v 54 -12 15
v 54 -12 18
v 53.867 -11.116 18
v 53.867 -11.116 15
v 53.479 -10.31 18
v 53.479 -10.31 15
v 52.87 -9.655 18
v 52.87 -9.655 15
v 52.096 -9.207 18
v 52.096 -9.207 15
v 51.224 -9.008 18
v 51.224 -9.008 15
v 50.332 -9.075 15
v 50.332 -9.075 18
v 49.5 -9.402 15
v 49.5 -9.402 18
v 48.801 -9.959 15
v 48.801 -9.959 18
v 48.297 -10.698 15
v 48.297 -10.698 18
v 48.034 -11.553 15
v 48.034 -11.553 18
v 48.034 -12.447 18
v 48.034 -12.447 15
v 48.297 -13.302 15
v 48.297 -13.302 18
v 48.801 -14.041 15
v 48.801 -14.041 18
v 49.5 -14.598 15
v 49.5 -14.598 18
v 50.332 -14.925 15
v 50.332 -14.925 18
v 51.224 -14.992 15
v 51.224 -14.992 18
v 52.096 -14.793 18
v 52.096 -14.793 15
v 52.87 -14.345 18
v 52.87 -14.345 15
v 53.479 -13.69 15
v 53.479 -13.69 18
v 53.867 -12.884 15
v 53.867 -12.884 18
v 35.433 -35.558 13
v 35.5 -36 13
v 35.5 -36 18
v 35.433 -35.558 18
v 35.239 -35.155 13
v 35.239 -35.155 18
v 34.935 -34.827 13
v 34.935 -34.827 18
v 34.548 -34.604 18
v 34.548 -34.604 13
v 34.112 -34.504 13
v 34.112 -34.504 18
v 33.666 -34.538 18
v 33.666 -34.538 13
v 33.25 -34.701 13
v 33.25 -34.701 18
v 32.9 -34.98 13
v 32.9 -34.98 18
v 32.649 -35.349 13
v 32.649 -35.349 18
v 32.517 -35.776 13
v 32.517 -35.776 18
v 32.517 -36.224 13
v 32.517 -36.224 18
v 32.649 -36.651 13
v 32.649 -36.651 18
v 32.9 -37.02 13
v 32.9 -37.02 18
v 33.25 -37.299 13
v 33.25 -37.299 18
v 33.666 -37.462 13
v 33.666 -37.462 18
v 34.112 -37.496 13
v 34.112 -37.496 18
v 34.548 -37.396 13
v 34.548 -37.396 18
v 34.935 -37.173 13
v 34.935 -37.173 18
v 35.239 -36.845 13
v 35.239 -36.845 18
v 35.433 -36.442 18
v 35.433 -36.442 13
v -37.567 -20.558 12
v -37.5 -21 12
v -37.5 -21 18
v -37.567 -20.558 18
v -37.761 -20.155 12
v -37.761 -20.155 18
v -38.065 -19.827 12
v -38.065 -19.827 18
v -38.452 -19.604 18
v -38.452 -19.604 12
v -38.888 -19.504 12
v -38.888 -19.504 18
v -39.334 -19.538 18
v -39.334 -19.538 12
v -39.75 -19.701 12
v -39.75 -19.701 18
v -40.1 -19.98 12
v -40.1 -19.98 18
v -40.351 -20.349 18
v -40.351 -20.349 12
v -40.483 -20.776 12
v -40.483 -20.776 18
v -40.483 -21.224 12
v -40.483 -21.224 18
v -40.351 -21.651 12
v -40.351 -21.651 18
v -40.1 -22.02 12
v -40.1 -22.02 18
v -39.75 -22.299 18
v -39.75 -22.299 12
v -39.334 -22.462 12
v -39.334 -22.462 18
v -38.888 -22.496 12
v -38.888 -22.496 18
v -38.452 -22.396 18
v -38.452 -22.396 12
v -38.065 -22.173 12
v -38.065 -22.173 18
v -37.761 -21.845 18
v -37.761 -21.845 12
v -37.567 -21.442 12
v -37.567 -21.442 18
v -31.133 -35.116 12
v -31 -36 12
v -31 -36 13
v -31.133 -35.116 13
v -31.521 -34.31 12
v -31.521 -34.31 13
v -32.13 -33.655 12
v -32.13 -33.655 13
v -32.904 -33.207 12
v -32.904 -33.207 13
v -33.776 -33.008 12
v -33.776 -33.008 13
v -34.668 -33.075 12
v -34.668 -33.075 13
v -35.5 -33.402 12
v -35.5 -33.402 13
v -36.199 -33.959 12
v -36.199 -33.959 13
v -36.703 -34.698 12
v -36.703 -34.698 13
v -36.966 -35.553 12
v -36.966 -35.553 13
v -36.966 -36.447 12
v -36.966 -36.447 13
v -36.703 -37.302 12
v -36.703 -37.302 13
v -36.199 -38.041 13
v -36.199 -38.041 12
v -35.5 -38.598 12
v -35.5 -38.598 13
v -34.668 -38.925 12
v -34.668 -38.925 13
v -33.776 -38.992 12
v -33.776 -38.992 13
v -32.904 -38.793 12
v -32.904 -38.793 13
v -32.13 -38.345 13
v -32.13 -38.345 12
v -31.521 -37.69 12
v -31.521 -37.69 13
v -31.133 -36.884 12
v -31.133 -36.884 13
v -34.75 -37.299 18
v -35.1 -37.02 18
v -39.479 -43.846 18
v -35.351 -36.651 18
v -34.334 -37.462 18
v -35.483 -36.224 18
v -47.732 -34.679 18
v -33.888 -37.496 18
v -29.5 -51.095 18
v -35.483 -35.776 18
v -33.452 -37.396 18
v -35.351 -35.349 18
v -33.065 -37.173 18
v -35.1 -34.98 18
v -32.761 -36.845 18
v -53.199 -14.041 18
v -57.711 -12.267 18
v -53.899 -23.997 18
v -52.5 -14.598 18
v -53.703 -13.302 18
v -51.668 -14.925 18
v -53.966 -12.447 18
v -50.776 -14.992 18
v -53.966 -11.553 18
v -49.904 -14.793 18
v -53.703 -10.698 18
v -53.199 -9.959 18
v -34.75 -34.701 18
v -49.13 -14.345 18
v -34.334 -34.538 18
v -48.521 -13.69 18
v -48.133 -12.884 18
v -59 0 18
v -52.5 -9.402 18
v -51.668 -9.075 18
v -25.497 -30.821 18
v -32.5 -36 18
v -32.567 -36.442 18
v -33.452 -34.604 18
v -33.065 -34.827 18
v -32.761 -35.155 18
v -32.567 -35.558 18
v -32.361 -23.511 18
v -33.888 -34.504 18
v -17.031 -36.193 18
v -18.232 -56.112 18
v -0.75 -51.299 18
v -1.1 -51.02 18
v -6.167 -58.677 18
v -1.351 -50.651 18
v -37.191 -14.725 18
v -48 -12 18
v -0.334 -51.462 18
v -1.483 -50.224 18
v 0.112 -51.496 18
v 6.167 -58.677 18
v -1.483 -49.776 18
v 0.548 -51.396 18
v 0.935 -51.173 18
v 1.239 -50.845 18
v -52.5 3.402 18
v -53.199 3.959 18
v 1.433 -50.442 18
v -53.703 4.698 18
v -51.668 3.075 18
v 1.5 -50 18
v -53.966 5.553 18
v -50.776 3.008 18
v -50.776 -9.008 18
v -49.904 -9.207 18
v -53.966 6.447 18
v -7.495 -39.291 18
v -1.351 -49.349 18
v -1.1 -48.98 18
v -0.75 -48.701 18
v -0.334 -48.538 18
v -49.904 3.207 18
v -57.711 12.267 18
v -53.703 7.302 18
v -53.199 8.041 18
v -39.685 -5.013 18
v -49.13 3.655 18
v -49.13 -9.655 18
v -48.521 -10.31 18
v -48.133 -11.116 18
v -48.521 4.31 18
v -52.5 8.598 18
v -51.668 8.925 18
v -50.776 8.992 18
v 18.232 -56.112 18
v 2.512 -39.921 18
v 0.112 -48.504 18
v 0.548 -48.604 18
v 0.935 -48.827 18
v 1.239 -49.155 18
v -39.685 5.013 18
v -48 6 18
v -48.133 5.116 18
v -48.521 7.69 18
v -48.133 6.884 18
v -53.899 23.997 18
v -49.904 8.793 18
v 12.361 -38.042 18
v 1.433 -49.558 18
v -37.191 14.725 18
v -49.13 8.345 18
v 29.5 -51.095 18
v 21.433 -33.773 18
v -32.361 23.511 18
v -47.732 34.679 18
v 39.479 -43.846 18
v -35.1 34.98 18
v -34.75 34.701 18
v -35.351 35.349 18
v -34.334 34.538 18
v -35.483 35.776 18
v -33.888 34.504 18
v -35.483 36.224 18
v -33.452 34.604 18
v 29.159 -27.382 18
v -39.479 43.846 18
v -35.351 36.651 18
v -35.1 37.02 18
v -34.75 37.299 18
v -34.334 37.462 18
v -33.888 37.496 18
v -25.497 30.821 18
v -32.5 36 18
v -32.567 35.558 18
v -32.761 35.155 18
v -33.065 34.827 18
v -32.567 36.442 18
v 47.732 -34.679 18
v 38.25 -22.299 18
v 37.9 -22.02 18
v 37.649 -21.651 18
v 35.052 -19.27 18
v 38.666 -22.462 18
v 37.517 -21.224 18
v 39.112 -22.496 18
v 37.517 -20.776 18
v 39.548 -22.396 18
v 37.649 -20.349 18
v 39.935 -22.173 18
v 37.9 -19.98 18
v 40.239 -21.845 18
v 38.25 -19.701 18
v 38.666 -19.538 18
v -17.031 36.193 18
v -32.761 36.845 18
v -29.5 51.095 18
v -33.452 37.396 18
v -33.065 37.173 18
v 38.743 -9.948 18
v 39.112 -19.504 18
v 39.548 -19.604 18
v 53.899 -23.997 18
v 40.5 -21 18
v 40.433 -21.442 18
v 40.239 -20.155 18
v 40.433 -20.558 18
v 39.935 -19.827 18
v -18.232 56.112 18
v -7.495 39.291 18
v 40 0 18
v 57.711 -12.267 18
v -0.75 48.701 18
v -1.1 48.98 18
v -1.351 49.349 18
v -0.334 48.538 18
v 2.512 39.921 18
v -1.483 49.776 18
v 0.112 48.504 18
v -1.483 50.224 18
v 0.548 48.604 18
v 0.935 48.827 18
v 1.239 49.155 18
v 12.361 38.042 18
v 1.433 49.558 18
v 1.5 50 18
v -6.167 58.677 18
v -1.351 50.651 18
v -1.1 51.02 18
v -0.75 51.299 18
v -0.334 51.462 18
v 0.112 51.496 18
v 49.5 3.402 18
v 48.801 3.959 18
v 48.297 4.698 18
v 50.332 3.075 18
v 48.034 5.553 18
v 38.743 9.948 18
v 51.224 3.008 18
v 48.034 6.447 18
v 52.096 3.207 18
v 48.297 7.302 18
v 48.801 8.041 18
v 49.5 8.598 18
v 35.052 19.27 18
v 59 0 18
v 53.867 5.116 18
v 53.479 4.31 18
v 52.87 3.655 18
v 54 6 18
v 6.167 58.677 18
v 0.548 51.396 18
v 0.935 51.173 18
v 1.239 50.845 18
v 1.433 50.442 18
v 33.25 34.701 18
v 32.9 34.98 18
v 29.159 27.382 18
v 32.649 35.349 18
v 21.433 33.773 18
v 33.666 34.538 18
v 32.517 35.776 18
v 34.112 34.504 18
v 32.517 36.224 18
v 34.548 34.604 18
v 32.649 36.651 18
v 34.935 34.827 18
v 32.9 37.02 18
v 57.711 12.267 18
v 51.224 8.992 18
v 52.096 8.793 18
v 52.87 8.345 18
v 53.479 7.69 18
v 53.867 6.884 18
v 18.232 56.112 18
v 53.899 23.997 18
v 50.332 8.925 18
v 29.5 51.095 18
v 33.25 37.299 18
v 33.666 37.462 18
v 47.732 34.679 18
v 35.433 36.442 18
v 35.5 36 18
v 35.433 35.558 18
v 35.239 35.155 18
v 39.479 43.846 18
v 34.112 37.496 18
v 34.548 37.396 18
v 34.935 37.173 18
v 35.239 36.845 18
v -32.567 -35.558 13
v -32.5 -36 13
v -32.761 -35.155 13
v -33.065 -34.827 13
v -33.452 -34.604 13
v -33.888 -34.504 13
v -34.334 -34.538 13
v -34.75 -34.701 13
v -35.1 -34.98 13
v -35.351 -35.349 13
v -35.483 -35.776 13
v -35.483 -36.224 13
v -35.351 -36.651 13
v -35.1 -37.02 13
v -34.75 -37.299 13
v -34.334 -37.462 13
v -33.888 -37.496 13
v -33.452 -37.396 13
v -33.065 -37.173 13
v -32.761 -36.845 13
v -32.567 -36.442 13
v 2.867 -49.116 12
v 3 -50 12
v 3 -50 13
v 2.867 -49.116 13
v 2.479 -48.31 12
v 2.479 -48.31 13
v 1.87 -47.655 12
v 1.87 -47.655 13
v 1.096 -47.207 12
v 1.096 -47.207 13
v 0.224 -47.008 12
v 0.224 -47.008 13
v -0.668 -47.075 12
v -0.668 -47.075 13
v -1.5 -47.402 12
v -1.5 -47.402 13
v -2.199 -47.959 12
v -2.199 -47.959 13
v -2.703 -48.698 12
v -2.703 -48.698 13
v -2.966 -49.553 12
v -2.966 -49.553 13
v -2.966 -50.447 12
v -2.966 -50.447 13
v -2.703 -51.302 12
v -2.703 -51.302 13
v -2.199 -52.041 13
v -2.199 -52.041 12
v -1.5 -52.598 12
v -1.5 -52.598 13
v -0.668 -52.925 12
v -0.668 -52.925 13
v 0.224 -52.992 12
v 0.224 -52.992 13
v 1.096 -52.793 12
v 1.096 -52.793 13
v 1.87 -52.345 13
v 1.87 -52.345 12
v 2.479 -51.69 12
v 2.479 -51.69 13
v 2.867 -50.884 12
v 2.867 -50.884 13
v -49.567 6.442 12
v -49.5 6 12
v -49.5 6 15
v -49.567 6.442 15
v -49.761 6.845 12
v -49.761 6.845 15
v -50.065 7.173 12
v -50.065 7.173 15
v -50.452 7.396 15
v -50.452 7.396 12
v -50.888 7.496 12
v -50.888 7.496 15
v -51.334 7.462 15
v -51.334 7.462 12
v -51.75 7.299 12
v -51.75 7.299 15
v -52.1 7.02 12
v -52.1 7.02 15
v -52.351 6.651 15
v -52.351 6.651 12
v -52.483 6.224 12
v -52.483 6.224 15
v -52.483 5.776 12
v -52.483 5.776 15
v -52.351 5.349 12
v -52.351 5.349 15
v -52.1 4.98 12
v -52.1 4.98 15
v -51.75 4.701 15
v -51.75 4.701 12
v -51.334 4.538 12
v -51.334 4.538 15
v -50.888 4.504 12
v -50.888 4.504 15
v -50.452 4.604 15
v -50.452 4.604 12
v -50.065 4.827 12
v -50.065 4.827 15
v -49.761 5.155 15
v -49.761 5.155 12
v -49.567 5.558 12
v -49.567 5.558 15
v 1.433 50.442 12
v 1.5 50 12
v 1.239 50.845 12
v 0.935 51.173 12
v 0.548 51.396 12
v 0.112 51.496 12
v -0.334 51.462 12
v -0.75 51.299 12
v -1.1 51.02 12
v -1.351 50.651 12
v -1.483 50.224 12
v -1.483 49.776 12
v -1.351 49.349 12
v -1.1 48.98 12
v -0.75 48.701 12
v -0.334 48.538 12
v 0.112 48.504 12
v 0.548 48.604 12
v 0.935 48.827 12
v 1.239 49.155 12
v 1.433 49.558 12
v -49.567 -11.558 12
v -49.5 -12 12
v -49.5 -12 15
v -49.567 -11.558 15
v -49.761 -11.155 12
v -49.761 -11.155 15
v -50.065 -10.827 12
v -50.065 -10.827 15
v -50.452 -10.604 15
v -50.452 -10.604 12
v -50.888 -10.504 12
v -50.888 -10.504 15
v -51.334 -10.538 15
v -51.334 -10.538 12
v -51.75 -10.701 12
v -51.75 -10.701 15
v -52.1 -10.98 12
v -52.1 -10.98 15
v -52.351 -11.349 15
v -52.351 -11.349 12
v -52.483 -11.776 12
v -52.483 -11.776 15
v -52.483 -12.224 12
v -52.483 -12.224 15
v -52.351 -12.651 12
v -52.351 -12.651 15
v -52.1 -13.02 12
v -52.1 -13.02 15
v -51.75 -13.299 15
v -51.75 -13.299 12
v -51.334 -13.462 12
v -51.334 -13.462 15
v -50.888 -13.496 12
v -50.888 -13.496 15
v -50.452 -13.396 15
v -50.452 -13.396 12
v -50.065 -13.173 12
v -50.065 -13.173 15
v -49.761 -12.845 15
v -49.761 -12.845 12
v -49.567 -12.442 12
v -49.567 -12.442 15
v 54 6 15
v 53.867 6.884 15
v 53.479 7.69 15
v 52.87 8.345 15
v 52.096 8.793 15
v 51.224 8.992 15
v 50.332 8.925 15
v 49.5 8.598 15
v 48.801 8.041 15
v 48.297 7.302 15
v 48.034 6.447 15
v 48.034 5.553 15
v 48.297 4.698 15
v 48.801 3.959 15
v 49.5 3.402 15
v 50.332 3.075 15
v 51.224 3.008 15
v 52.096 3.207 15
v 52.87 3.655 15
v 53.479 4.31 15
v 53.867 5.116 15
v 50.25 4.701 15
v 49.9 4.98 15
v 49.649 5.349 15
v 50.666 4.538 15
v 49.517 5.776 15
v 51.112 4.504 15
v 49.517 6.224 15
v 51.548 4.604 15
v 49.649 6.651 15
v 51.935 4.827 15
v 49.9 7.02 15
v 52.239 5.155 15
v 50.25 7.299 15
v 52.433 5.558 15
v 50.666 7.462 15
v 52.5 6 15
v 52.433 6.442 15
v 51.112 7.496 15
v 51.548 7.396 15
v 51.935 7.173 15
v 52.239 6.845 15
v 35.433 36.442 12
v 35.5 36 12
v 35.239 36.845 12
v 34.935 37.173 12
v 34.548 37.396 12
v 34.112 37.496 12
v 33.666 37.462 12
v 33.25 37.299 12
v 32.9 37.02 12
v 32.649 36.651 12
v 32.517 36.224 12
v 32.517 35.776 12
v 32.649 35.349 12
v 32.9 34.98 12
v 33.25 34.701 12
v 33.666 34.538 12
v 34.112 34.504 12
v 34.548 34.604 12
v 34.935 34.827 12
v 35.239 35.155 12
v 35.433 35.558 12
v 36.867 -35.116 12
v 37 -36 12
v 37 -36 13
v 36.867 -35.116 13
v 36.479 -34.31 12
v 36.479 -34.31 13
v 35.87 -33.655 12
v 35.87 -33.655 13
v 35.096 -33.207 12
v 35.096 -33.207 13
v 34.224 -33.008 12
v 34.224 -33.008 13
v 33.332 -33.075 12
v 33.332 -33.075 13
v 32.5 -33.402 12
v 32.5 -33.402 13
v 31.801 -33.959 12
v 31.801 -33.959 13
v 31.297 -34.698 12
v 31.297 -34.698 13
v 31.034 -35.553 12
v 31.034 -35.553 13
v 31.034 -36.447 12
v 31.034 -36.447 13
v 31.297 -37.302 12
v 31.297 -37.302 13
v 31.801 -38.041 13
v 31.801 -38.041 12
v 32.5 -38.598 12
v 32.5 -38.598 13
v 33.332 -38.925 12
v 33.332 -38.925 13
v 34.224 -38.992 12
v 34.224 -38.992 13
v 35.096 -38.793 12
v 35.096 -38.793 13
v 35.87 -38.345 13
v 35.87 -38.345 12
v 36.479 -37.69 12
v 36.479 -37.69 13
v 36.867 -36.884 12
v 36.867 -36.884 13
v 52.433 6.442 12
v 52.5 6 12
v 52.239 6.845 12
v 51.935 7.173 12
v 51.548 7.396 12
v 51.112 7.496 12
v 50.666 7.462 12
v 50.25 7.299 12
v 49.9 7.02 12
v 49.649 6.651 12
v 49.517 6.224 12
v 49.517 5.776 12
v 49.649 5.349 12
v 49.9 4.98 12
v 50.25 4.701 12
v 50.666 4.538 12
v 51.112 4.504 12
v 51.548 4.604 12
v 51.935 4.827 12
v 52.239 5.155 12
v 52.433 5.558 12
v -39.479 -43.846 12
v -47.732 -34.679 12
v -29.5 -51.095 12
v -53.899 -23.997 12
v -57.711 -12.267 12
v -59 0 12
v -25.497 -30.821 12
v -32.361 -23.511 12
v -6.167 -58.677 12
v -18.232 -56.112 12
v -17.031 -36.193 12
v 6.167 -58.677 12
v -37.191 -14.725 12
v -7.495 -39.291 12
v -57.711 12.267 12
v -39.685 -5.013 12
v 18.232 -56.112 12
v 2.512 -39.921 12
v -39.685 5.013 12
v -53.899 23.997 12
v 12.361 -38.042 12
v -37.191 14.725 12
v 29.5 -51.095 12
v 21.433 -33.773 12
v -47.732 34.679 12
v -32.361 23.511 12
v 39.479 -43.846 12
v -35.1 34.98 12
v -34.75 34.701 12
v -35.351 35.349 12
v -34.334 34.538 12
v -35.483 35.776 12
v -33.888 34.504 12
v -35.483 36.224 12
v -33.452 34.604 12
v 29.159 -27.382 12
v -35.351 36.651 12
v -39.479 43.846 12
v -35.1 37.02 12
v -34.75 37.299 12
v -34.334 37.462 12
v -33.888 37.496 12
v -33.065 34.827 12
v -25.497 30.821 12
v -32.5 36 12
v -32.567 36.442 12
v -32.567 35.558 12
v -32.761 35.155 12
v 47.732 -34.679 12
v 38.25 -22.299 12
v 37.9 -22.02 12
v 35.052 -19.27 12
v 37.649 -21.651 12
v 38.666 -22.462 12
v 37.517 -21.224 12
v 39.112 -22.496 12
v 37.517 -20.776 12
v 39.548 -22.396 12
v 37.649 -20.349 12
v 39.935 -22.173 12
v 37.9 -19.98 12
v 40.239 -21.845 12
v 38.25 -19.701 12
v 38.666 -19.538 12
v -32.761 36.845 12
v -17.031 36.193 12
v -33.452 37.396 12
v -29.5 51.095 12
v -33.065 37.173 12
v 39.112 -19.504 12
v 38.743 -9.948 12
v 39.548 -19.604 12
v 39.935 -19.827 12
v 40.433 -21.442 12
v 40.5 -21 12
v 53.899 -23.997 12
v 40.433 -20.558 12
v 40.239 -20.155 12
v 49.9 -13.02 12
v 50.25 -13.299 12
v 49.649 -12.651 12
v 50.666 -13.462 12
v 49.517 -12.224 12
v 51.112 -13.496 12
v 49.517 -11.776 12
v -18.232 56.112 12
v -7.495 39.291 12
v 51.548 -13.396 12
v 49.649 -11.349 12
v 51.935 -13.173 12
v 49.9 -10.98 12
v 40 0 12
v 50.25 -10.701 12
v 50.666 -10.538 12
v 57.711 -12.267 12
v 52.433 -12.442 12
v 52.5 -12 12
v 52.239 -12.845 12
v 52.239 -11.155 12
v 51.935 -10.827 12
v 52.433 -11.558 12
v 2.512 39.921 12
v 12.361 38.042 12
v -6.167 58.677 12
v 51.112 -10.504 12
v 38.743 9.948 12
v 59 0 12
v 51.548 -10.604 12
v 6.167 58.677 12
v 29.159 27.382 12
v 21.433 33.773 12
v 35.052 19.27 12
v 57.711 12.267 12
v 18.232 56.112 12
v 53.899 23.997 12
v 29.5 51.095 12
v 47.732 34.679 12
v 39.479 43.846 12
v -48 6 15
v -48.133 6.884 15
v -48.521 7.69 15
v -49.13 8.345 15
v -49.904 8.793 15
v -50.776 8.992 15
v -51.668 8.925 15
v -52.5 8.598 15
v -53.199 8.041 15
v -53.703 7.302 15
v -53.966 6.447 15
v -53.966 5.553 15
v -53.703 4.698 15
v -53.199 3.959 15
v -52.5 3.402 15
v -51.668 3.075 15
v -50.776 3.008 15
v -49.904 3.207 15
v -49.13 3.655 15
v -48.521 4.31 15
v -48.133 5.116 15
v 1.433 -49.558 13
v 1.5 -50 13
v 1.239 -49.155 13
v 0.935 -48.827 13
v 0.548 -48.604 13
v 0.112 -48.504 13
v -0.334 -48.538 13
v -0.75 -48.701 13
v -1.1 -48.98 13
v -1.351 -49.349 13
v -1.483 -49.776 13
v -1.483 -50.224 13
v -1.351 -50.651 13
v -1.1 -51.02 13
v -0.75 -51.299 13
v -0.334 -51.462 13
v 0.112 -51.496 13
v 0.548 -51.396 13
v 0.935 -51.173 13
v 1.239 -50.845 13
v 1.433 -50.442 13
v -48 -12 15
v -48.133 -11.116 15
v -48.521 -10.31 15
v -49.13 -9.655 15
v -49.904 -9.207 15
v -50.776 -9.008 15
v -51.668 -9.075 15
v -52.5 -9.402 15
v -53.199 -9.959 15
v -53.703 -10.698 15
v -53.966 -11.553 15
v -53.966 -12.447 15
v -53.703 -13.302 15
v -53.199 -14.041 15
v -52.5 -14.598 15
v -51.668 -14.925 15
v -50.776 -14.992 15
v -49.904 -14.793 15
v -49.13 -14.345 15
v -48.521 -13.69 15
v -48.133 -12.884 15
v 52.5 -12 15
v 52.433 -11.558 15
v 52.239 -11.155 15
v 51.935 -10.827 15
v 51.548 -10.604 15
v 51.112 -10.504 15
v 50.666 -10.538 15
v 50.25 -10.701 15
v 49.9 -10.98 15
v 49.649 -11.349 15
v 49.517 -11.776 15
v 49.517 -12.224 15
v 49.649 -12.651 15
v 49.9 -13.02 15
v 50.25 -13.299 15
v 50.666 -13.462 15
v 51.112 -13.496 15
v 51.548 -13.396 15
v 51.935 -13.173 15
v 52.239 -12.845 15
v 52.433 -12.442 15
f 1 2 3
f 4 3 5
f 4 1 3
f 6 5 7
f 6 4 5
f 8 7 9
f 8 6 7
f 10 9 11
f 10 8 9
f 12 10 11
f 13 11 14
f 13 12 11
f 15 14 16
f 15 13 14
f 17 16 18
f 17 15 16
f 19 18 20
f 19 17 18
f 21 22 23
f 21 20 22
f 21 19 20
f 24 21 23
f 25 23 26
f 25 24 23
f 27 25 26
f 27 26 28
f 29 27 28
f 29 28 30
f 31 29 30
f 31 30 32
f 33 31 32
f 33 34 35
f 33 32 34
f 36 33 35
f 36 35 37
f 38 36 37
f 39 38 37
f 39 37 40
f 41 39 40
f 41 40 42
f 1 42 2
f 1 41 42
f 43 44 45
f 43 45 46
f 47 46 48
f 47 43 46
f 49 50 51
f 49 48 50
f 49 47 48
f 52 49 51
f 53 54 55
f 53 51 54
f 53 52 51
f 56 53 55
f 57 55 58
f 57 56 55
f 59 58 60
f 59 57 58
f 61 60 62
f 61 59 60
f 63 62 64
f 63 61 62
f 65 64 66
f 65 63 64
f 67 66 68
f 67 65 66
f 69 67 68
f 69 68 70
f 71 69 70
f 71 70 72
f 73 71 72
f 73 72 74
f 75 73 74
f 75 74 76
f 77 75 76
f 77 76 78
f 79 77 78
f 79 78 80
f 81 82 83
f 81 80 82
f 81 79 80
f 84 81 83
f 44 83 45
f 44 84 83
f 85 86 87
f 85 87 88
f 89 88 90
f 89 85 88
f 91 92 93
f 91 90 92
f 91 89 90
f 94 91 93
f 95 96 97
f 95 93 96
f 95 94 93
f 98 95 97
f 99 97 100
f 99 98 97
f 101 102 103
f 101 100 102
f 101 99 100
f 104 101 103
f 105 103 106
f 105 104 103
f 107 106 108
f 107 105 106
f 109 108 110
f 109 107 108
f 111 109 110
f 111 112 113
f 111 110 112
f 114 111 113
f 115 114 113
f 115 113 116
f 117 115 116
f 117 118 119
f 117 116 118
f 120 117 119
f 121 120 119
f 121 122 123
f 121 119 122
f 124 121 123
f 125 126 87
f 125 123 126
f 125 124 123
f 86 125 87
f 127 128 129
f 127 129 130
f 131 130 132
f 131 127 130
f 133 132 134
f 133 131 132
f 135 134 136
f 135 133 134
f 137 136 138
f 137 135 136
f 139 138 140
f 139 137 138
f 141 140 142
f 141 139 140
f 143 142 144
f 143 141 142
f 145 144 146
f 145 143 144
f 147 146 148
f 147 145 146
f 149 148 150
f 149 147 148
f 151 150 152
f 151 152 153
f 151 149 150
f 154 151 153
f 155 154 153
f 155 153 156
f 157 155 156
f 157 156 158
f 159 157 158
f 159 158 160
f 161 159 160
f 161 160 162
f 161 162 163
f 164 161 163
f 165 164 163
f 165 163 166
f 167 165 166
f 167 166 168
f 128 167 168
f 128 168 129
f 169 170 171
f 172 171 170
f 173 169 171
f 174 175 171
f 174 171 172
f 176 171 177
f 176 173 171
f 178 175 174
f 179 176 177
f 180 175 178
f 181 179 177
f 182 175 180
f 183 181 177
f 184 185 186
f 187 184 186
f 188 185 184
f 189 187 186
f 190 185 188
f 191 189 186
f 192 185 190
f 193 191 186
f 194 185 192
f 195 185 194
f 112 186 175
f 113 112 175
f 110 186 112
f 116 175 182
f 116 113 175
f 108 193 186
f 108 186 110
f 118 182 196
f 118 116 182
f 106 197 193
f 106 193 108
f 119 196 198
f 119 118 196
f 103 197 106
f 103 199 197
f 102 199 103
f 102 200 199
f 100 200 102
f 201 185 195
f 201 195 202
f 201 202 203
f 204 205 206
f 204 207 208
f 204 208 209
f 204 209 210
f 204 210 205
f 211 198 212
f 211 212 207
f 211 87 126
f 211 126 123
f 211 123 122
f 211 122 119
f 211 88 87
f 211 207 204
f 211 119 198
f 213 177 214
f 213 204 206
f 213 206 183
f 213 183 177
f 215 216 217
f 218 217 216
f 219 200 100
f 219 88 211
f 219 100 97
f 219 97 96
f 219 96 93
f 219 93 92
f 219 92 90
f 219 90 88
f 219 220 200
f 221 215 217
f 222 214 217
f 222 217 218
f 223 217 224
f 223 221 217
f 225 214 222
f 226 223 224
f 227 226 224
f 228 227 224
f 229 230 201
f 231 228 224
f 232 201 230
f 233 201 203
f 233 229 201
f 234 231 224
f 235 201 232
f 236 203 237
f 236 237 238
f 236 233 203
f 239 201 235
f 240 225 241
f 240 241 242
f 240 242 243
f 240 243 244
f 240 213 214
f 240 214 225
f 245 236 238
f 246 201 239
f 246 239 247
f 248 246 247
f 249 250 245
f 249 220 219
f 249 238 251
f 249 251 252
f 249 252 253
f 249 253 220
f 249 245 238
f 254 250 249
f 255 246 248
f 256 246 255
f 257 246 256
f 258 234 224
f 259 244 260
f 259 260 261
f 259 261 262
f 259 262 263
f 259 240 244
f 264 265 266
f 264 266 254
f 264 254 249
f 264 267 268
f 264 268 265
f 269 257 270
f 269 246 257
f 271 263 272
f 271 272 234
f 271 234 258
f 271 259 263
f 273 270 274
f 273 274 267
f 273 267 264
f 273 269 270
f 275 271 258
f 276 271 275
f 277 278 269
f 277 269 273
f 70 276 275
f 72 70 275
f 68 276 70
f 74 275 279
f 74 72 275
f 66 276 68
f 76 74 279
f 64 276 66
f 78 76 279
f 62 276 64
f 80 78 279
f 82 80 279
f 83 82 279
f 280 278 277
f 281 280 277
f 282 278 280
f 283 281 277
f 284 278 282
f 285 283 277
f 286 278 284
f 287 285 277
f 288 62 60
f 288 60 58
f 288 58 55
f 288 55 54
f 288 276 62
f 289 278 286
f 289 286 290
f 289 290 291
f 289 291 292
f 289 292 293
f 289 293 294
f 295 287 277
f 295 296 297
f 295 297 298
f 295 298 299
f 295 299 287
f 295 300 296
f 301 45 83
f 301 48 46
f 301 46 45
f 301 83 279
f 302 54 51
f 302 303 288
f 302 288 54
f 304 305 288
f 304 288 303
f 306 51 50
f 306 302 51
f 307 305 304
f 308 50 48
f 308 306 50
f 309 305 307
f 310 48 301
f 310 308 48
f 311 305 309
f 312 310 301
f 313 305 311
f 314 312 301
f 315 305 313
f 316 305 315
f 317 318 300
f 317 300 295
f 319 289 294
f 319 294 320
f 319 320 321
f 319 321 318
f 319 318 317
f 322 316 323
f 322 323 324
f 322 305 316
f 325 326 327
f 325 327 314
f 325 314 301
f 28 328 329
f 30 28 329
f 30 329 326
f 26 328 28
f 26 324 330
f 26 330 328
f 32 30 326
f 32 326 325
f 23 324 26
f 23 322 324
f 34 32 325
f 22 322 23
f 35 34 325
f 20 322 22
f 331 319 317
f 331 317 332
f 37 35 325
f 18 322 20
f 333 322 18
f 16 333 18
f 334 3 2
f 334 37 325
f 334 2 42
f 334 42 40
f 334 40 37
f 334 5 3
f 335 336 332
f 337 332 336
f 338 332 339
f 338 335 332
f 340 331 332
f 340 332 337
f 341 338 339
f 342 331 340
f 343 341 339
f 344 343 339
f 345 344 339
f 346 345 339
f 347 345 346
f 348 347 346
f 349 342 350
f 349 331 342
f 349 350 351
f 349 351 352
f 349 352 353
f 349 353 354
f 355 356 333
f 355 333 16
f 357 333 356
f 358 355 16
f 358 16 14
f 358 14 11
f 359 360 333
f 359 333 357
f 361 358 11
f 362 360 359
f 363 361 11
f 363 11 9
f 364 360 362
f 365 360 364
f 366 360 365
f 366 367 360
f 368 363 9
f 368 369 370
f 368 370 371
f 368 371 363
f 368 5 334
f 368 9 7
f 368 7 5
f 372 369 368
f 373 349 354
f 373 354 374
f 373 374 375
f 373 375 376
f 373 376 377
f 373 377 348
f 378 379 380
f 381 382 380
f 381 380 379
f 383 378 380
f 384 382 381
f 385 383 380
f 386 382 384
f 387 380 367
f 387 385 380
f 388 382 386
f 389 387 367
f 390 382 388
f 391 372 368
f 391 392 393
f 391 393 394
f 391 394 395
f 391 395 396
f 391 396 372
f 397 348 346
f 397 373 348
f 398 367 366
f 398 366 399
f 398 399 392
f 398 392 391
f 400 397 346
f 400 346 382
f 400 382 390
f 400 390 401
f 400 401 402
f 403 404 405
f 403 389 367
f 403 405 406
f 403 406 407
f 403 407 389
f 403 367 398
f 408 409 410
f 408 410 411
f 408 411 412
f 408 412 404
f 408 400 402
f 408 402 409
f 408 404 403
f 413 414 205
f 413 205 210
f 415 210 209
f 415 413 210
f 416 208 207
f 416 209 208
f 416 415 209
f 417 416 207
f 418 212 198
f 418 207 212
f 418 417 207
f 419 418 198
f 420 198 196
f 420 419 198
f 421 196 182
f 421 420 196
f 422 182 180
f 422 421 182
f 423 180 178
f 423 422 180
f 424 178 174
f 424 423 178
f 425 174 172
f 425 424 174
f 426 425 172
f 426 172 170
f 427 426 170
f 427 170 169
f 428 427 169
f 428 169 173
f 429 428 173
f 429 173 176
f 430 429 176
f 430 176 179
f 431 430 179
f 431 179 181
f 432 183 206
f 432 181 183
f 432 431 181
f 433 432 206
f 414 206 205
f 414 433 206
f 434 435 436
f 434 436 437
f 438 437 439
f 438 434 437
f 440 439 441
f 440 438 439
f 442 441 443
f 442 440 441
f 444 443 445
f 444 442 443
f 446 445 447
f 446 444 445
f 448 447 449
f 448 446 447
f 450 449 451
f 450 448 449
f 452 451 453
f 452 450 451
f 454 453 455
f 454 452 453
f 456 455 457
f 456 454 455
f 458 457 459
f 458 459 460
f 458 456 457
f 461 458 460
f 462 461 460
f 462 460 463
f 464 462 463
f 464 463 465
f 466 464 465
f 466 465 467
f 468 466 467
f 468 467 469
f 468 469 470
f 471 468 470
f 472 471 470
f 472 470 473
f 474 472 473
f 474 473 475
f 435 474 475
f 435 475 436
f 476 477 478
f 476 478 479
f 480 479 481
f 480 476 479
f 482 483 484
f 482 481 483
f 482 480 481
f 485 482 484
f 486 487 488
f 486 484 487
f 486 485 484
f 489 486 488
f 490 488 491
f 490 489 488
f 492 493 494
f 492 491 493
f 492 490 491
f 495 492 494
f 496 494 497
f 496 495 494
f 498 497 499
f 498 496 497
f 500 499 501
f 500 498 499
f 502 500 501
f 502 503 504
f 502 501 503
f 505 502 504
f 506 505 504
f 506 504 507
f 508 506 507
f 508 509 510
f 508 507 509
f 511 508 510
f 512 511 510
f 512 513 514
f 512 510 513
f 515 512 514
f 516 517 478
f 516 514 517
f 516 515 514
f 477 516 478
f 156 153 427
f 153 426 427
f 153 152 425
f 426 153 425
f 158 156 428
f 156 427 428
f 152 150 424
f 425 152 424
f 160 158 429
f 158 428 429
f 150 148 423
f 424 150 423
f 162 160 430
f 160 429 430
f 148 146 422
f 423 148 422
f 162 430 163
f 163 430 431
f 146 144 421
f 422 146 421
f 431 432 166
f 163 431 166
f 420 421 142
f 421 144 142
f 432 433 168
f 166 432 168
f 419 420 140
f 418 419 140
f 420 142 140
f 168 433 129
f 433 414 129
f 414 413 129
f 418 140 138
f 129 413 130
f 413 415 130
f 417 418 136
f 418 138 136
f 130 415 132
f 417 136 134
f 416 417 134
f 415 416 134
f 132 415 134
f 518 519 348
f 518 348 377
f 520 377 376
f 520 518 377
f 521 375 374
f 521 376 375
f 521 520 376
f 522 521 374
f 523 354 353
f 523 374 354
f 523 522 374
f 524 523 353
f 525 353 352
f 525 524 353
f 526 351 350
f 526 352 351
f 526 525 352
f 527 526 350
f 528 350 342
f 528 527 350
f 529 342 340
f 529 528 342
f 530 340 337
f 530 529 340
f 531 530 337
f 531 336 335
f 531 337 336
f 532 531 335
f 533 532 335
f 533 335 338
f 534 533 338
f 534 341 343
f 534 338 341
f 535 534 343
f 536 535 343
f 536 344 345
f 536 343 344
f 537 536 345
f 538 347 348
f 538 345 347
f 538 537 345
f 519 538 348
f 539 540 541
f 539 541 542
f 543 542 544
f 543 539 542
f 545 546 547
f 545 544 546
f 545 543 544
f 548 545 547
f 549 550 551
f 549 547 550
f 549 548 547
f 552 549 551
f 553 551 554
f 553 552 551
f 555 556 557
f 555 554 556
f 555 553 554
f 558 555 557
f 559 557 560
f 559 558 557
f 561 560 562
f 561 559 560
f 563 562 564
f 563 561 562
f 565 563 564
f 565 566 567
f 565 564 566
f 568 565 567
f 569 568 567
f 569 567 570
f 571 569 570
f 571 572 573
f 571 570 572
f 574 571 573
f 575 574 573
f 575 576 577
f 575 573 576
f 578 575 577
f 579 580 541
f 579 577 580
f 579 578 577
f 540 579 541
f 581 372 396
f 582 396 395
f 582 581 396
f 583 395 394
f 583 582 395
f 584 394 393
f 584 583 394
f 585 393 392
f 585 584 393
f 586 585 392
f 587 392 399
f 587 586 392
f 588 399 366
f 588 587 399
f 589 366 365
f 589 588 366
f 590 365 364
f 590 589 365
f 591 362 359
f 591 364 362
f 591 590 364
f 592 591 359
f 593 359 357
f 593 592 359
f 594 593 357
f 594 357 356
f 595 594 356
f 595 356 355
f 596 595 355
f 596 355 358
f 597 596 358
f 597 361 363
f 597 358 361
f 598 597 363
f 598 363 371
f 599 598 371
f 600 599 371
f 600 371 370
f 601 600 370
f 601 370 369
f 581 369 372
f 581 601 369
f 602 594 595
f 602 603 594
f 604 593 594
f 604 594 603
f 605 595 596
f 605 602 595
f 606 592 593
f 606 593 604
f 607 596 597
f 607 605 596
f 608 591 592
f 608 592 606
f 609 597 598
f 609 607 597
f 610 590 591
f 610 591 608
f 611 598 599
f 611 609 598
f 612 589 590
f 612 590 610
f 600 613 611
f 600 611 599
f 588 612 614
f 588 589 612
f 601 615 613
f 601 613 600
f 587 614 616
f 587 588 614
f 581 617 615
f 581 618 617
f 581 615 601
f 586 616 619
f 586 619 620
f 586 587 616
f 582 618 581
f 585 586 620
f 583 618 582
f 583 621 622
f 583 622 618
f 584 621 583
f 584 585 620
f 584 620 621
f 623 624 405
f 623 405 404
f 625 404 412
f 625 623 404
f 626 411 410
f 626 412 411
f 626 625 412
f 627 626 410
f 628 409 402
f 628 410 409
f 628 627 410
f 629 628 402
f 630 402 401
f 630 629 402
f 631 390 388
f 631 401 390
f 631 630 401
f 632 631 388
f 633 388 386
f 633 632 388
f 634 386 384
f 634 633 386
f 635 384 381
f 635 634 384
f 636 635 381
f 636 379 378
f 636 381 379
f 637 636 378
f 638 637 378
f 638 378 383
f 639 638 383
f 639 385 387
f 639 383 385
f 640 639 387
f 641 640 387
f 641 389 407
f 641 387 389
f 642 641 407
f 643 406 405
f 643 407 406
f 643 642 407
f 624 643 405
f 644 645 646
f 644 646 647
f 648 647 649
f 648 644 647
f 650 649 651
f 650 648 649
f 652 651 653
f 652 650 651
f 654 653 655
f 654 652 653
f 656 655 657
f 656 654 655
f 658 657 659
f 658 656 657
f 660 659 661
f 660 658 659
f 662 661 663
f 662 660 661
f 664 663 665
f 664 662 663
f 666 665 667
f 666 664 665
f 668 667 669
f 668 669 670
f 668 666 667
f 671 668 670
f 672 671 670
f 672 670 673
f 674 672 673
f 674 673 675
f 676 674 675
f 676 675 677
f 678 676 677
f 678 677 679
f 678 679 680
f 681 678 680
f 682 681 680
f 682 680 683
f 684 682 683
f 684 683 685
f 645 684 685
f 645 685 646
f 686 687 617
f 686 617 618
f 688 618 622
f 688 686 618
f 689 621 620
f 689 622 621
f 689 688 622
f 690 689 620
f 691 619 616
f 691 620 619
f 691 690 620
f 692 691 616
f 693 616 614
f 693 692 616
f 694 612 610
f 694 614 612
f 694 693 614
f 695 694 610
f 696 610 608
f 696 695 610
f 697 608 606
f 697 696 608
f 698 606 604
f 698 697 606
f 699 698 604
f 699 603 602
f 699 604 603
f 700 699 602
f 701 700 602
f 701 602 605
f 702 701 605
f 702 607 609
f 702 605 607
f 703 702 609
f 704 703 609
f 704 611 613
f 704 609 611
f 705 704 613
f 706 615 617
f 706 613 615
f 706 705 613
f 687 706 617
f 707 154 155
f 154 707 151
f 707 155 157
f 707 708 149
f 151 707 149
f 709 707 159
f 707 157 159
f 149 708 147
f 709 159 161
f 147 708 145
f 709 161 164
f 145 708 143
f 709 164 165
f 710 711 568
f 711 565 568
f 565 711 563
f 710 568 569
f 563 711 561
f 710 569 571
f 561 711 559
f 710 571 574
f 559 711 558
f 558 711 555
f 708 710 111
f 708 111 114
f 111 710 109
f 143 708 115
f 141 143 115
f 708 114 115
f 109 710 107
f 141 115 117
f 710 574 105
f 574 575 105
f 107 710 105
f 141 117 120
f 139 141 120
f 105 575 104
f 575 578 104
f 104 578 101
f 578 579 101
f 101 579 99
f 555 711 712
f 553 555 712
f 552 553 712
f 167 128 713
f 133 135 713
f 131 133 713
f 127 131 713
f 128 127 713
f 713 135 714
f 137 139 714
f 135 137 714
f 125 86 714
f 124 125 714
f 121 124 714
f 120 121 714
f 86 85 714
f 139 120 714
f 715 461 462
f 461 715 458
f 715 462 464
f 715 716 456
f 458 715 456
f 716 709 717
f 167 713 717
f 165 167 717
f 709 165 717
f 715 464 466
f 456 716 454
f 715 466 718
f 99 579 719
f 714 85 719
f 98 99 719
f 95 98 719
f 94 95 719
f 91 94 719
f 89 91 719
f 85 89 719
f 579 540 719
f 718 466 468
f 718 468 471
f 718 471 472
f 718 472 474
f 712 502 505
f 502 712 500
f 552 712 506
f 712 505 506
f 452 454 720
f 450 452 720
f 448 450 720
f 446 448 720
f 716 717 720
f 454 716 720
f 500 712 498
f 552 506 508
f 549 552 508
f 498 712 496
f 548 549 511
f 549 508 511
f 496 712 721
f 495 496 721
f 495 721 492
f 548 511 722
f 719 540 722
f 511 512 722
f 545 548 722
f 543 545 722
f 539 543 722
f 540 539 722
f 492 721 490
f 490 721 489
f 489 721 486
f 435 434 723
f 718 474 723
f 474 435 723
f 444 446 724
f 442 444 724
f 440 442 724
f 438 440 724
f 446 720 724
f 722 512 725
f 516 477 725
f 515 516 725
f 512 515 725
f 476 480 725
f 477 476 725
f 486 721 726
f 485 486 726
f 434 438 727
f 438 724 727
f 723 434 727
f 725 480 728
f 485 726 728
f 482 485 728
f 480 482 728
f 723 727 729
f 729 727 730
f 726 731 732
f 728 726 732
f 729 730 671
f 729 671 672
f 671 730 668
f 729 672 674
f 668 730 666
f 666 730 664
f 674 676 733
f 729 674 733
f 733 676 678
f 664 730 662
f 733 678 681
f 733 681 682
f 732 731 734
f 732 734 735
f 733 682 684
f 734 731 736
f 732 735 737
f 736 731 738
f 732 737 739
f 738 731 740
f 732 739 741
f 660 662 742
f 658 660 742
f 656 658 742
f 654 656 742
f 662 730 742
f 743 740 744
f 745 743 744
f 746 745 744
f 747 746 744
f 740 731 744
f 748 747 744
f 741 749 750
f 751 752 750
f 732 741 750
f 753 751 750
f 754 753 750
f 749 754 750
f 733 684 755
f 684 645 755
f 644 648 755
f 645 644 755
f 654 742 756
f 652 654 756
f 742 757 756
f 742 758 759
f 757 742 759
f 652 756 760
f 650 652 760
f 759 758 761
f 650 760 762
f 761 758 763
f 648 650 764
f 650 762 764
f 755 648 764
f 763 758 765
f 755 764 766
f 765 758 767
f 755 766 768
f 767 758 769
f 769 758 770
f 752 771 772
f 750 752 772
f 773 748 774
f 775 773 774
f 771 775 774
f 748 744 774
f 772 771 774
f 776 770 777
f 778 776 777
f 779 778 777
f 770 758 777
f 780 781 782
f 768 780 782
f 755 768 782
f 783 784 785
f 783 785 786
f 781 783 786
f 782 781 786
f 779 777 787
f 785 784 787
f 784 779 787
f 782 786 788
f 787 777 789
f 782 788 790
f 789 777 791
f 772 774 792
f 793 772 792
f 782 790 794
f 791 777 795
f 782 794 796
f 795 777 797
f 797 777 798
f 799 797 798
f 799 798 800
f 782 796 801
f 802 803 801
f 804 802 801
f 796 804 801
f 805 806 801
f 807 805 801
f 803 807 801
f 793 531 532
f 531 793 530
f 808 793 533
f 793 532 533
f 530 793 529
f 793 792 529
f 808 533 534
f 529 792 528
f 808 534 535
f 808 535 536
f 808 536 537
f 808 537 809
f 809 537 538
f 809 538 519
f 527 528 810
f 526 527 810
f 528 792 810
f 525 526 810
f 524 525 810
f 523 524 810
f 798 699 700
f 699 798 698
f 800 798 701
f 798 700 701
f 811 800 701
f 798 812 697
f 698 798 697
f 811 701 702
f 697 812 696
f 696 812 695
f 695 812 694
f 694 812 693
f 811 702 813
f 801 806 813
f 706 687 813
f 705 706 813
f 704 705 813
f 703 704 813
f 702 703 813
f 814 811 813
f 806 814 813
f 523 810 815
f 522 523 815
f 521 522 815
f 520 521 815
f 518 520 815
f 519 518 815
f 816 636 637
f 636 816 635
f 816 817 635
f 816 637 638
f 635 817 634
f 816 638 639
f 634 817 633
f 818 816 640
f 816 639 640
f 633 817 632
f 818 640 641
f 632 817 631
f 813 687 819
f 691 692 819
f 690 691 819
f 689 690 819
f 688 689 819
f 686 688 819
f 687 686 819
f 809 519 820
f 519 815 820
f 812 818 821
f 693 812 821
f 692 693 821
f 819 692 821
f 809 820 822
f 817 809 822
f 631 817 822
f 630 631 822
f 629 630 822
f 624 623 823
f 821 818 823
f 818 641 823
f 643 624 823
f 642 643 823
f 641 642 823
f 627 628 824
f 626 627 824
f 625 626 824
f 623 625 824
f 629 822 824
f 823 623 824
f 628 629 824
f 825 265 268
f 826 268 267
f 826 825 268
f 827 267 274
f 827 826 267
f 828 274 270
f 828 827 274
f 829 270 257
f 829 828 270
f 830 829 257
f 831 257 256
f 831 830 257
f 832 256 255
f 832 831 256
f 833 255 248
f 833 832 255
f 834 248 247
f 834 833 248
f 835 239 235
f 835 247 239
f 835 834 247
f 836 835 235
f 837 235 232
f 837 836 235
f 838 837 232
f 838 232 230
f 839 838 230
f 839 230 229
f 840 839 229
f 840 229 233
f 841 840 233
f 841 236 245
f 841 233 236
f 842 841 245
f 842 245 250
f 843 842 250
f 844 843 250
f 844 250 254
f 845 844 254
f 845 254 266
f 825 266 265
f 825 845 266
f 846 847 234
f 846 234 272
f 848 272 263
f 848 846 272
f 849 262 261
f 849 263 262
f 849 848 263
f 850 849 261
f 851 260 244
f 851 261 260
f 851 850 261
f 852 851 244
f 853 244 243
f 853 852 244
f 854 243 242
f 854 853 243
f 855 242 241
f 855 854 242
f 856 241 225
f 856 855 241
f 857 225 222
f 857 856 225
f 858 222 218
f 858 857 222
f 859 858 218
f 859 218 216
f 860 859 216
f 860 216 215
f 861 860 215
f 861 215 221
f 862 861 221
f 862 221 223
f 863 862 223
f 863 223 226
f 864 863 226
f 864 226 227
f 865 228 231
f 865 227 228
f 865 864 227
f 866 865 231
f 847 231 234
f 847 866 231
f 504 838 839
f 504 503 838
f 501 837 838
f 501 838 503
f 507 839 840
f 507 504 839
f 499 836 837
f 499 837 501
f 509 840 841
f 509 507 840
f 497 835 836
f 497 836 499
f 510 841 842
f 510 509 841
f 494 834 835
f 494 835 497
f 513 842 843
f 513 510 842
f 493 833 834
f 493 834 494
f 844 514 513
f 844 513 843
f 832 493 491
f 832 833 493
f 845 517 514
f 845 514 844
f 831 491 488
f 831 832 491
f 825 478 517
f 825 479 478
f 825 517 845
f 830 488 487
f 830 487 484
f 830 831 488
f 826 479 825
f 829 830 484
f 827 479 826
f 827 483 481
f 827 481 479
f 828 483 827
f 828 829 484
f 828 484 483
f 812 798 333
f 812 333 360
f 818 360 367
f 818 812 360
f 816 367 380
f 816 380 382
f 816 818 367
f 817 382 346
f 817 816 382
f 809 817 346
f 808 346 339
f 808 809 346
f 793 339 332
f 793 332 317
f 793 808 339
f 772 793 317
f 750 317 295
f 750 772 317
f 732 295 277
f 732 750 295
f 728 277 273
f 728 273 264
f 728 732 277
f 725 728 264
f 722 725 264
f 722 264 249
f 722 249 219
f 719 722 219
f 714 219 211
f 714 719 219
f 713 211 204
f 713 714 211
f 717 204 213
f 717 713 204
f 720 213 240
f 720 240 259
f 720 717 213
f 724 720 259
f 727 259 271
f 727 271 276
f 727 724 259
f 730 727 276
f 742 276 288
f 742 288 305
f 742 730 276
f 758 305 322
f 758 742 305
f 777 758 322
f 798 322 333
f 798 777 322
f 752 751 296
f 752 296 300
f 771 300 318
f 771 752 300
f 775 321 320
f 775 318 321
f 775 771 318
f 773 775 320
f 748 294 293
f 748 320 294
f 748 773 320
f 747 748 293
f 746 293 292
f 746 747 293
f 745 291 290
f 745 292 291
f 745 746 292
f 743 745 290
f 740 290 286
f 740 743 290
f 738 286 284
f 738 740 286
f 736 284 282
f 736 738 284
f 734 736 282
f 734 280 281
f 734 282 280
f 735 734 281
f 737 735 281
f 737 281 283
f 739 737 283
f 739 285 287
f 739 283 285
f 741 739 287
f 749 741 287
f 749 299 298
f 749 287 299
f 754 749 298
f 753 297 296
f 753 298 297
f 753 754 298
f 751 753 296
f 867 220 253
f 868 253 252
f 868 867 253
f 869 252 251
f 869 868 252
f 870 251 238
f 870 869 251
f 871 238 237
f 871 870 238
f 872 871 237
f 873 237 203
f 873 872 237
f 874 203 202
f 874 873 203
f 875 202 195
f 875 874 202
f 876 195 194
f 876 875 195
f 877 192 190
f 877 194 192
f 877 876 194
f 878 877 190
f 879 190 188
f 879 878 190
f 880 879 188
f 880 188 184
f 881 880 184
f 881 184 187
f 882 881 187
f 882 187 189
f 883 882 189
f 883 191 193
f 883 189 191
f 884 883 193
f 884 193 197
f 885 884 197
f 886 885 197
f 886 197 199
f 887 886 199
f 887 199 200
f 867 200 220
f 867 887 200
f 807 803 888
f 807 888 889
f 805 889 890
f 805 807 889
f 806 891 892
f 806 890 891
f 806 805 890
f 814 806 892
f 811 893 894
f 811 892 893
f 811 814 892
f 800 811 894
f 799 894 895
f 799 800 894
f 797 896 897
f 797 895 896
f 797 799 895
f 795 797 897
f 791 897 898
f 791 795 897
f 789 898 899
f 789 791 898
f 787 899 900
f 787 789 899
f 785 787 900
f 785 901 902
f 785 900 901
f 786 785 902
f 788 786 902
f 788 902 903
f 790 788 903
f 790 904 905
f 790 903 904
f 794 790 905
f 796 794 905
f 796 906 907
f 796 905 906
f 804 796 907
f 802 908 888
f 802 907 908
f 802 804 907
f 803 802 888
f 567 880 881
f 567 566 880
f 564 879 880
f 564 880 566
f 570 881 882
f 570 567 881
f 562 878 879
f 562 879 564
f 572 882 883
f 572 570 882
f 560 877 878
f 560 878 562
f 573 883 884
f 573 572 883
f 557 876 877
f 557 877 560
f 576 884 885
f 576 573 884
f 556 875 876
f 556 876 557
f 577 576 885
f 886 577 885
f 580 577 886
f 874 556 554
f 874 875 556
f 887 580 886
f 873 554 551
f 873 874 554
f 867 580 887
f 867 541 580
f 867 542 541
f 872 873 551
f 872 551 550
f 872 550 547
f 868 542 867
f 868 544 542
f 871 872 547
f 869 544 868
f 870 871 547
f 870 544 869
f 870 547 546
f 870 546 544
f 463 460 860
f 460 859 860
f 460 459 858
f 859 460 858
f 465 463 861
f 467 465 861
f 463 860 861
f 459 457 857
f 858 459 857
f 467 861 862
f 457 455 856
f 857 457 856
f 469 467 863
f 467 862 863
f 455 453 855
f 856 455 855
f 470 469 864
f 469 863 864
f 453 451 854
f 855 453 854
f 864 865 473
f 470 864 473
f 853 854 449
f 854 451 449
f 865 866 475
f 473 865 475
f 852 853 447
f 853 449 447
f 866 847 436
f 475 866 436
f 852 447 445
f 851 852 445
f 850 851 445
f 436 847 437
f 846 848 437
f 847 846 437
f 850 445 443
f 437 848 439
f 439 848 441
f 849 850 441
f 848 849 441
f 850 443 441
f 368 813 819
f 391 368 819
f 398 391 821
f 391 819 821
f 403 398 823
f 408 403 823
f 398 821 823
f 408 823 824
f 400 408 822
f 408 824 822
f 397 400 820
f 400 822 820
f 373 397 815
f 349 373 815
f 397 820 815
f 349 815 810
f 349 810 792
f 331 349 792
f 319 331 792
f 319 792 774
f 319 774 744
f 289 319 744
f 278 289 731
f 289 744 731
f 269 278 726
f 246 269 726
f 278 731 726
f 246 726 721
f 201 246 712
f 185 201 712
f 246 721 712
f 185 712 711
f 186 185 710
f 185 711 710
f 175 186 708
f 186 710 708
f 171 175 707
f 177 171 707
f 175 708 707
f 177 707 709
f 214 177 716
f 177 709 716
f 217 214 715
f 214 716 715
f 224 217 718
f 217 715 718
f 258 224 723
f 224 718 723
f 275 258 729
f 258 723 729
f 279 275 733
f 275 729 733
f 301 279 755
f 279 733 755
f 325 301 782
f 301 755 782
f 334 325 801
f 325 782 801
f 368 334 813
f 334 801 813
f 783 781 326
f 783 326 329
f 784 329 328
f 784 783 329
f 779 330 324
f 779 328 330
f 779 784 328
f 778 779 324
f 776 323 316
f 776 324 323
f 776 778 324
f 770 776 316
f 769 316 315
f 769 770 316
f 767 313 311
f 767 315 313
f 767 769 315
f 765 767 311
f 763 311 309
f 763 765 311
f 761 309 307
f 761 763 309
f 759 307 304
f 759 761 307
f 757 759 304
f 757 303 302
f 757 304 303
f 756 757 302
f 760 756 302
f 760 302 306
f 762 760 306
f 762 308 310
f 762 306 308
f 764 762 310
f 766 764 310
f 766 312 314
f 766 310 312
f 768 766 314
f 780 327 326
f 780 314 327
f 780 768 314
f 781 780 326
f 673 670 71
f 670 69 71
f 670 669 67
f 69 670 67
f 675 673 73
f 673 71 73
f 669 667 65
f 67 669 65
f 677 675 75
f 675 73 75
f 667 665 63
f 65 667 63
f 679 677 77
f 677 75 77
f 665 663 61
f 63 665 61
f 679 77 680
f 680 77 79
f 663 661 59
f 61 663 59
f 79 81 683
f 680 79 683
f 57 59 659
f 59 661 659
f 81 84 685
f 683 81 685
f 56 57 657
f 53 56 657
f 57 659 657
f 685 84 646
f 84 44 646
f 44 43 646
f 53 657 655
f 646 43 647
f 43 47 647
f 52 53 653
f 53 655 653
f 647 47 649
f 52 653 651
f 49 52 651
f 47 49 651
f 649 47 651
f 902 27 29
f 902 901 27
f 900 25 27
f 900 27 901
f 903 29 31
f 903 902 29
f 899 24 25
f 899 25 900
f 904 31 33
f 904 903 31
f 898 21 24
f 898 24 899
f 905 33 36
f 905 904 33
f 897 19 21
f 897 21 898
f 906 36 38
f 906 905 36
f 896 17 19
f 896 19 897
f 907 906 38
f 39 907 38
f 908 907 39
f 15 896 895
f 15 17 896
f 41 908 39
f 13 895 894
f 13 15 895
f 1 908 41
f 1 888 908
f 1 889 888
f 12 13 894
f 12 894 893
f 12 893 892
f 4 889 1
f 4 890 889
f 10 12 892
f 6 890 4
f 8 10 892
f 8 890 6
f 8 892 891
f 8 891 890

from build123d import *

# Parameters (mm, degrees)
CYLINDER531_R     = 1.5
CYLINDER531_DEPTH = 100
CYLINDER530_R     = 1.5
CYLINDER530_DEPTH = 100
CYLINDER368_R     = 1.5
CYLINDER368_DEPTH = 50
CYLINDER369_R     = 3
CYLINDER369_DEPTH = 4
CYLINDER366_R     = 1.5
CYLINDER366_DEPTH = 50
CYLINDER358_R     = 1.5
CYLINDER358_DEPTH = 50
CYLINDER357_R     = 1.5
CYLINDER357_DEPTH = 50
CYLINDER361_R     = 3
CYLINDER361_DEPTH = 4
CYLINDER362_R     = 3
CYLINDER362_DEPTH = 4
CYLINDER332_R     = 3
CYLINDER332_DEPTH = 4
CYLINDER333_R     = 3
CYLINDER333_DEPTH = 4
CYLINDER352_R     = 3
CYLINDER352_DEPTH = 4
CYLINDER351_R     = 3
CYLINDER351_DEPTH = 4
CYLINDER344_R     = 1.5
CYLINDER344_DEPTH = 50
CYLINDER343_R     = 1.5
CYLINDER343_DEPTH = 50
CYLINDER340_R     = 1.5
CYLINDER340_DEPTH = 50
CYLINDER339_R     = 1.5
CYLINDER339_DEPTH = 50
CYLINDER338_R     = 1.5
CYLINDER338_DEPTH = 100
CYLINDER337_R     = 1.5
CYLINDER337_DEPTH = 100
CYLINDER301_R     = 1.5
CYLINDER301_DEPTH = 50
CYLINDER302_R     = 1.5
CYLINDER302_DEPTH = 50
TUBE018_R         = 59
TUBE018_R_2       = 40
TUBE018_DEPTH     = 6


with BuildPart() as v_lec531:
    # Cylinder531 → Cylinder531 (new body)
    with BuildSketch(Plane(origin=(39, -21, 0), x_dir=(1, 0, 0), z_dir=(0, 0, 1))):
        Circle(CYLINDER531_R)
    extrude(amount=CYLINDER531_DEPTH)


with BuildPart() as compound308:
    # Cylinder530 → Cylinder530 (new body)
    with BuildSketch(Plane(origin=(-39, -21, 0), x_dir=(1, 0, 0), z_dir=(0, 0, 1))):
        Circle(CYLINDER530_R)
    extrude(amount=CYLINDER530_DEPTH)

    # Compound308: union Válec531
    add(v_lec531.part)


with BuildPart() as v_lec368:
    # Cylinder368 → Cylinder368 (new body)
    with BuildSketch(Plane(origin=(0, -50, 0), x_dir=(1, 0, 0), z_dir=(0, 0, 1))):
        Circle(CYLINDER368_R)
    extrude(amount=CYLINDER368_DEPTH)


with BuildPart() as v_lec369:
    # Cylinder369 → Cylinder369 (new body)
    with BuildSketch(Plane(origin=(0, -50, 9), x_dir=(1, 0, 0), z_dir=(0, 0, 1))):
        Circle(CYLINDER369_R)
    extrude(amount=CYLINDER369_DEPTH)


with BuildPart() as v_lec366:
    # Cylinder366 → Cylinder366 (new body)
    with BuildSketch(Plane(origin=(0, 50, 0), x_dir=(1, 0, 0), z_dir=(0, 0, 1))):
        Circle(CYLINDER366_R)
    extrude(amount=CYLINDER366_DEPTH)


with BuildPart() as v_lec358:
    # Cylinder358 → Cylinder358 (new body)
    with BuildSketch(Plane(origin=(-34, -36, 0), x_dir=(1, 0, 0), z_dir=(0, 0, 1))):
        Circle(CYLINDER358_R)
    extrude(amount=CYLINDER358_DEPTH)


with BuildPart() as compound306:
    # Cylinder357 → Cylinder357 (new body)
    with BuildSketch(Plane(origin=(34, -36, 0), x_dir=(1, 0, 0), z_dir=(0, 0, 1))):
        Circle(CYLINDER357_R)
    extrude(amount=CYLINDER357_DEPTH)

    # Compound306: union Válec358
    add(v_lec358.part)


with BuildPart() as v_lec361:
    # Cylinder361 → Cylinder361 (new body)
    with BuildSketch(Plane(origin=(-34, -36, 0), x_dir=(1, 0, 0), z_dir=(0, 0, 1))):
        Circle(CYLINDER361_R)
    extrude(amount=CYLINDER361_DEPTH)


with BuildPart() as compound307:
    # Cylinder362 → Cylinder362 (new body)
    with BuildSketch(Plane(origin=(34, -36, 0), x_dir=(1, 0, 0), z_dir=(0, 0, 1))):
        Circle(CYLINDER362_R)
    extrude(amount=CYLINDER362_DEPTH)

    # Compound307: union Válec361
    add(v_lec361.part)


with BuildPart() as compound307_1:
    # Compound307 placement: moved
    add(compound307.part.moved(Location((0, 0, 9))))


with BuildPart() as v_lec332:
    # Cylinder332 → Cylinder332 (new body)
    with BuildSketch(Plane(origin=(-51, 6, 17), x_dir=(1, 0, 0), z_dir=(0, 0, 1))):
        Circle(CYLINDER332_R)
    extrude(amount=CYLINDER332_DEPTH)


with BuildPart() as compound300:
    # Cylinder333 → Cylinder333 (new body)
    with BuildSketch(Plane(origin=(51, 6, 17), x_dir=(1, 0, 0), z_dir=(0, 0, 1))):
        Circle(CYLINDER333_R)
    extrude(amount=CYLINDER333_DEPTH)

    # Compound300: union Válec332
    add(v_lec332.part)


with BuildPart() as compound300_1:
    # Compound300 placement: moved
    add(compound300.part.moved(Location((0, 0, -2))))


with BuildPart() as v_lec352:
    # Cylinder352 → Cylinder352 (new body)
    with BuildSketch(Plane(origin=(51, -12, 0), x_dir=(1, 0, 0), z_dir=(0, 0, 1))):
        Circle(CYLINDER352_R)
    extrude(amount=CYLINDER352_DEPTH)


with BuildPart() as compound303:
    # Cylinder351 → Cylinder351 (new body)
    with BuildSketch(Plane(origin=(-51, -12, 0), x_dir=(1, 0, 0), z_dir=(0, 0, 1))):
        Circle(CYLINDER351_R)
    extrude(amount=CYLINDER351_DEPTH)

    # Compound303: union Válec352
    add(v_lec352.part)


with BuildPart() as compound303_1:
    # Compound303 placement: moved
    add(compound303.part.moved(Location((0, 0, 15))))


with BuildPart() as v_lec344:
    # Cylinder344 → Cylinder344 (new body)
    with BuildSketch(Plane(origin=(-34, 36, 0), x_dir=(1, 0, 0), z_dir=(0, 0, 1))):
        Circle(CYLINDER344_R)
    extrude(amount=CYLINDER344_DEPTH)


with BuildPart() as v_lec343:
    # Cylinder343 → Cylinder343 (new body)
    with BuildSketch(Plane(origin=(34, 36, 0), x_dir=(1, 0, 0), z_dir=(0, 0, 1))):
        Circle(CYLINDER343_R)
    extrude(amount=CYLINDER343_DEPTH)


with BuildPart() as v_lec340:
    # Cylinder340 → Cylinder340 (new body)
    with BuildSketch(Plane(origin=(51, 6, 0), x_dir=(1, 0, 0), z_dir=(0, 0, 1))):
        Circle(CYLINDER340_R)
    extrude(amount=CYLINDER340_DEPTH)


with BuildPart() as v_lec339:
    # Cylinder339 → Cylinder339 (new body)
    with BuildSketch(Plane(origin=(-51, 6, 0), x_dir=(1, 0, 0), z_dir=(0, 0, 1))):
        Circle(CYLINDER339_R)
    extrude(amount=CYLINDER339_DEPTH)


with BuildPart() as v_lec338:
    # Cylinder338 → Cylinder338 (new body)
    with BuildSketch(Plane(origin=(51, -12, 0), x_dir=(1, 0, 0), z_dir=(0, 0, 1))):
        Circle(CYLINDER338_R)
    extrude(amount=CYLINDER338_DEPTH)


with BuildPart() as compound301:
    # Cylinder337 → Cylinder337 (new body)
    with BuildSketch(Plane(origin=(-51, -12, 0), x_dir=(1, 0, 0), z_dir=(0, 0, 1))):
        Circle(CYLINDER337_R)
    extrude(amount=CYLINDER337_DEPTH)

    # Compound301: union Válec344, Válec343, Válec340, Válec339, Válec338
    add(v_lec344.part)
    add(v_lec343.part)
    add(v_lec340.part)
    add(v_lec339.part)
    add(v_lec338.part)


with BuildPart() as v_lec301:
    # Cylinder301 → Cylinder301 (new body)
    with BuildSketch(Plane(origin=(34, 36, 0), x_dir=(1, 0, 0), z_dir=(0, 0, 1))):
        Circle(CYLINDER301_R)
    extrude(amount=CYLINDER301_DEPTH)


with BuildPart() as compound285:
    # Cylinder302 → Cylinder302 (new body)
    with BuildSketch(Plane(origin=(-34, 36, 0), x_dir=(1, 0, 0), z_dir=(0, 0, 1))):
        Circle(CYLINDER302_R)
    extrude(amount=CYLINDER302_DEPTH)

    # Compound285: union Válec301
    add(v_lec301.part)


with BuildPart() as cut:
    # Tube018 → Tube018 (new body)
    with BuildSketch(Plane.XY.offset(12)):
        Circle(TUBE018_R)
        Circle(TUBE018_R_2, mode=Mode.SUBTRACT)
    extrude(amount=TUBE018_DEPTH)

    # Cut133: cut Compound285
    add(compound285.part, mode=Mode.SUBTRACT)

    # Cut145: cut Compound301
    add(compound301.part, mode=Mode.SUBTRACT)

    # Cut146: cut Compound303
    add(compound303_1.part, mode=Mode.SUBTRACT)

    # Cut147: cut Compound300
    add(compound300_1.part, mode=Mode.SUBTRACT)

    # Cut151: cut Compound307
    add(compound307_1.part, mode=Mode.SUBTRACT)

    # Cut152: cut Compound306
    add(compound306.part, mode=Mode.SUBTRACT)

    # Cut156: cut Válec366
    add(v_lec366.part, mode=Mode.SUBTRACT)

    # Cut158: cut Válec369
    add(v_lec369.part, mode=Mode.SUBTRACT)

    # Cut159: cut Válec368
    add(v_lec368.part, mode=Mode.SUBTRACT)

    # Cut: cut Compound308
    add(compound308.part, mode=Mode.SUBTRACT)


solid = cut.part
